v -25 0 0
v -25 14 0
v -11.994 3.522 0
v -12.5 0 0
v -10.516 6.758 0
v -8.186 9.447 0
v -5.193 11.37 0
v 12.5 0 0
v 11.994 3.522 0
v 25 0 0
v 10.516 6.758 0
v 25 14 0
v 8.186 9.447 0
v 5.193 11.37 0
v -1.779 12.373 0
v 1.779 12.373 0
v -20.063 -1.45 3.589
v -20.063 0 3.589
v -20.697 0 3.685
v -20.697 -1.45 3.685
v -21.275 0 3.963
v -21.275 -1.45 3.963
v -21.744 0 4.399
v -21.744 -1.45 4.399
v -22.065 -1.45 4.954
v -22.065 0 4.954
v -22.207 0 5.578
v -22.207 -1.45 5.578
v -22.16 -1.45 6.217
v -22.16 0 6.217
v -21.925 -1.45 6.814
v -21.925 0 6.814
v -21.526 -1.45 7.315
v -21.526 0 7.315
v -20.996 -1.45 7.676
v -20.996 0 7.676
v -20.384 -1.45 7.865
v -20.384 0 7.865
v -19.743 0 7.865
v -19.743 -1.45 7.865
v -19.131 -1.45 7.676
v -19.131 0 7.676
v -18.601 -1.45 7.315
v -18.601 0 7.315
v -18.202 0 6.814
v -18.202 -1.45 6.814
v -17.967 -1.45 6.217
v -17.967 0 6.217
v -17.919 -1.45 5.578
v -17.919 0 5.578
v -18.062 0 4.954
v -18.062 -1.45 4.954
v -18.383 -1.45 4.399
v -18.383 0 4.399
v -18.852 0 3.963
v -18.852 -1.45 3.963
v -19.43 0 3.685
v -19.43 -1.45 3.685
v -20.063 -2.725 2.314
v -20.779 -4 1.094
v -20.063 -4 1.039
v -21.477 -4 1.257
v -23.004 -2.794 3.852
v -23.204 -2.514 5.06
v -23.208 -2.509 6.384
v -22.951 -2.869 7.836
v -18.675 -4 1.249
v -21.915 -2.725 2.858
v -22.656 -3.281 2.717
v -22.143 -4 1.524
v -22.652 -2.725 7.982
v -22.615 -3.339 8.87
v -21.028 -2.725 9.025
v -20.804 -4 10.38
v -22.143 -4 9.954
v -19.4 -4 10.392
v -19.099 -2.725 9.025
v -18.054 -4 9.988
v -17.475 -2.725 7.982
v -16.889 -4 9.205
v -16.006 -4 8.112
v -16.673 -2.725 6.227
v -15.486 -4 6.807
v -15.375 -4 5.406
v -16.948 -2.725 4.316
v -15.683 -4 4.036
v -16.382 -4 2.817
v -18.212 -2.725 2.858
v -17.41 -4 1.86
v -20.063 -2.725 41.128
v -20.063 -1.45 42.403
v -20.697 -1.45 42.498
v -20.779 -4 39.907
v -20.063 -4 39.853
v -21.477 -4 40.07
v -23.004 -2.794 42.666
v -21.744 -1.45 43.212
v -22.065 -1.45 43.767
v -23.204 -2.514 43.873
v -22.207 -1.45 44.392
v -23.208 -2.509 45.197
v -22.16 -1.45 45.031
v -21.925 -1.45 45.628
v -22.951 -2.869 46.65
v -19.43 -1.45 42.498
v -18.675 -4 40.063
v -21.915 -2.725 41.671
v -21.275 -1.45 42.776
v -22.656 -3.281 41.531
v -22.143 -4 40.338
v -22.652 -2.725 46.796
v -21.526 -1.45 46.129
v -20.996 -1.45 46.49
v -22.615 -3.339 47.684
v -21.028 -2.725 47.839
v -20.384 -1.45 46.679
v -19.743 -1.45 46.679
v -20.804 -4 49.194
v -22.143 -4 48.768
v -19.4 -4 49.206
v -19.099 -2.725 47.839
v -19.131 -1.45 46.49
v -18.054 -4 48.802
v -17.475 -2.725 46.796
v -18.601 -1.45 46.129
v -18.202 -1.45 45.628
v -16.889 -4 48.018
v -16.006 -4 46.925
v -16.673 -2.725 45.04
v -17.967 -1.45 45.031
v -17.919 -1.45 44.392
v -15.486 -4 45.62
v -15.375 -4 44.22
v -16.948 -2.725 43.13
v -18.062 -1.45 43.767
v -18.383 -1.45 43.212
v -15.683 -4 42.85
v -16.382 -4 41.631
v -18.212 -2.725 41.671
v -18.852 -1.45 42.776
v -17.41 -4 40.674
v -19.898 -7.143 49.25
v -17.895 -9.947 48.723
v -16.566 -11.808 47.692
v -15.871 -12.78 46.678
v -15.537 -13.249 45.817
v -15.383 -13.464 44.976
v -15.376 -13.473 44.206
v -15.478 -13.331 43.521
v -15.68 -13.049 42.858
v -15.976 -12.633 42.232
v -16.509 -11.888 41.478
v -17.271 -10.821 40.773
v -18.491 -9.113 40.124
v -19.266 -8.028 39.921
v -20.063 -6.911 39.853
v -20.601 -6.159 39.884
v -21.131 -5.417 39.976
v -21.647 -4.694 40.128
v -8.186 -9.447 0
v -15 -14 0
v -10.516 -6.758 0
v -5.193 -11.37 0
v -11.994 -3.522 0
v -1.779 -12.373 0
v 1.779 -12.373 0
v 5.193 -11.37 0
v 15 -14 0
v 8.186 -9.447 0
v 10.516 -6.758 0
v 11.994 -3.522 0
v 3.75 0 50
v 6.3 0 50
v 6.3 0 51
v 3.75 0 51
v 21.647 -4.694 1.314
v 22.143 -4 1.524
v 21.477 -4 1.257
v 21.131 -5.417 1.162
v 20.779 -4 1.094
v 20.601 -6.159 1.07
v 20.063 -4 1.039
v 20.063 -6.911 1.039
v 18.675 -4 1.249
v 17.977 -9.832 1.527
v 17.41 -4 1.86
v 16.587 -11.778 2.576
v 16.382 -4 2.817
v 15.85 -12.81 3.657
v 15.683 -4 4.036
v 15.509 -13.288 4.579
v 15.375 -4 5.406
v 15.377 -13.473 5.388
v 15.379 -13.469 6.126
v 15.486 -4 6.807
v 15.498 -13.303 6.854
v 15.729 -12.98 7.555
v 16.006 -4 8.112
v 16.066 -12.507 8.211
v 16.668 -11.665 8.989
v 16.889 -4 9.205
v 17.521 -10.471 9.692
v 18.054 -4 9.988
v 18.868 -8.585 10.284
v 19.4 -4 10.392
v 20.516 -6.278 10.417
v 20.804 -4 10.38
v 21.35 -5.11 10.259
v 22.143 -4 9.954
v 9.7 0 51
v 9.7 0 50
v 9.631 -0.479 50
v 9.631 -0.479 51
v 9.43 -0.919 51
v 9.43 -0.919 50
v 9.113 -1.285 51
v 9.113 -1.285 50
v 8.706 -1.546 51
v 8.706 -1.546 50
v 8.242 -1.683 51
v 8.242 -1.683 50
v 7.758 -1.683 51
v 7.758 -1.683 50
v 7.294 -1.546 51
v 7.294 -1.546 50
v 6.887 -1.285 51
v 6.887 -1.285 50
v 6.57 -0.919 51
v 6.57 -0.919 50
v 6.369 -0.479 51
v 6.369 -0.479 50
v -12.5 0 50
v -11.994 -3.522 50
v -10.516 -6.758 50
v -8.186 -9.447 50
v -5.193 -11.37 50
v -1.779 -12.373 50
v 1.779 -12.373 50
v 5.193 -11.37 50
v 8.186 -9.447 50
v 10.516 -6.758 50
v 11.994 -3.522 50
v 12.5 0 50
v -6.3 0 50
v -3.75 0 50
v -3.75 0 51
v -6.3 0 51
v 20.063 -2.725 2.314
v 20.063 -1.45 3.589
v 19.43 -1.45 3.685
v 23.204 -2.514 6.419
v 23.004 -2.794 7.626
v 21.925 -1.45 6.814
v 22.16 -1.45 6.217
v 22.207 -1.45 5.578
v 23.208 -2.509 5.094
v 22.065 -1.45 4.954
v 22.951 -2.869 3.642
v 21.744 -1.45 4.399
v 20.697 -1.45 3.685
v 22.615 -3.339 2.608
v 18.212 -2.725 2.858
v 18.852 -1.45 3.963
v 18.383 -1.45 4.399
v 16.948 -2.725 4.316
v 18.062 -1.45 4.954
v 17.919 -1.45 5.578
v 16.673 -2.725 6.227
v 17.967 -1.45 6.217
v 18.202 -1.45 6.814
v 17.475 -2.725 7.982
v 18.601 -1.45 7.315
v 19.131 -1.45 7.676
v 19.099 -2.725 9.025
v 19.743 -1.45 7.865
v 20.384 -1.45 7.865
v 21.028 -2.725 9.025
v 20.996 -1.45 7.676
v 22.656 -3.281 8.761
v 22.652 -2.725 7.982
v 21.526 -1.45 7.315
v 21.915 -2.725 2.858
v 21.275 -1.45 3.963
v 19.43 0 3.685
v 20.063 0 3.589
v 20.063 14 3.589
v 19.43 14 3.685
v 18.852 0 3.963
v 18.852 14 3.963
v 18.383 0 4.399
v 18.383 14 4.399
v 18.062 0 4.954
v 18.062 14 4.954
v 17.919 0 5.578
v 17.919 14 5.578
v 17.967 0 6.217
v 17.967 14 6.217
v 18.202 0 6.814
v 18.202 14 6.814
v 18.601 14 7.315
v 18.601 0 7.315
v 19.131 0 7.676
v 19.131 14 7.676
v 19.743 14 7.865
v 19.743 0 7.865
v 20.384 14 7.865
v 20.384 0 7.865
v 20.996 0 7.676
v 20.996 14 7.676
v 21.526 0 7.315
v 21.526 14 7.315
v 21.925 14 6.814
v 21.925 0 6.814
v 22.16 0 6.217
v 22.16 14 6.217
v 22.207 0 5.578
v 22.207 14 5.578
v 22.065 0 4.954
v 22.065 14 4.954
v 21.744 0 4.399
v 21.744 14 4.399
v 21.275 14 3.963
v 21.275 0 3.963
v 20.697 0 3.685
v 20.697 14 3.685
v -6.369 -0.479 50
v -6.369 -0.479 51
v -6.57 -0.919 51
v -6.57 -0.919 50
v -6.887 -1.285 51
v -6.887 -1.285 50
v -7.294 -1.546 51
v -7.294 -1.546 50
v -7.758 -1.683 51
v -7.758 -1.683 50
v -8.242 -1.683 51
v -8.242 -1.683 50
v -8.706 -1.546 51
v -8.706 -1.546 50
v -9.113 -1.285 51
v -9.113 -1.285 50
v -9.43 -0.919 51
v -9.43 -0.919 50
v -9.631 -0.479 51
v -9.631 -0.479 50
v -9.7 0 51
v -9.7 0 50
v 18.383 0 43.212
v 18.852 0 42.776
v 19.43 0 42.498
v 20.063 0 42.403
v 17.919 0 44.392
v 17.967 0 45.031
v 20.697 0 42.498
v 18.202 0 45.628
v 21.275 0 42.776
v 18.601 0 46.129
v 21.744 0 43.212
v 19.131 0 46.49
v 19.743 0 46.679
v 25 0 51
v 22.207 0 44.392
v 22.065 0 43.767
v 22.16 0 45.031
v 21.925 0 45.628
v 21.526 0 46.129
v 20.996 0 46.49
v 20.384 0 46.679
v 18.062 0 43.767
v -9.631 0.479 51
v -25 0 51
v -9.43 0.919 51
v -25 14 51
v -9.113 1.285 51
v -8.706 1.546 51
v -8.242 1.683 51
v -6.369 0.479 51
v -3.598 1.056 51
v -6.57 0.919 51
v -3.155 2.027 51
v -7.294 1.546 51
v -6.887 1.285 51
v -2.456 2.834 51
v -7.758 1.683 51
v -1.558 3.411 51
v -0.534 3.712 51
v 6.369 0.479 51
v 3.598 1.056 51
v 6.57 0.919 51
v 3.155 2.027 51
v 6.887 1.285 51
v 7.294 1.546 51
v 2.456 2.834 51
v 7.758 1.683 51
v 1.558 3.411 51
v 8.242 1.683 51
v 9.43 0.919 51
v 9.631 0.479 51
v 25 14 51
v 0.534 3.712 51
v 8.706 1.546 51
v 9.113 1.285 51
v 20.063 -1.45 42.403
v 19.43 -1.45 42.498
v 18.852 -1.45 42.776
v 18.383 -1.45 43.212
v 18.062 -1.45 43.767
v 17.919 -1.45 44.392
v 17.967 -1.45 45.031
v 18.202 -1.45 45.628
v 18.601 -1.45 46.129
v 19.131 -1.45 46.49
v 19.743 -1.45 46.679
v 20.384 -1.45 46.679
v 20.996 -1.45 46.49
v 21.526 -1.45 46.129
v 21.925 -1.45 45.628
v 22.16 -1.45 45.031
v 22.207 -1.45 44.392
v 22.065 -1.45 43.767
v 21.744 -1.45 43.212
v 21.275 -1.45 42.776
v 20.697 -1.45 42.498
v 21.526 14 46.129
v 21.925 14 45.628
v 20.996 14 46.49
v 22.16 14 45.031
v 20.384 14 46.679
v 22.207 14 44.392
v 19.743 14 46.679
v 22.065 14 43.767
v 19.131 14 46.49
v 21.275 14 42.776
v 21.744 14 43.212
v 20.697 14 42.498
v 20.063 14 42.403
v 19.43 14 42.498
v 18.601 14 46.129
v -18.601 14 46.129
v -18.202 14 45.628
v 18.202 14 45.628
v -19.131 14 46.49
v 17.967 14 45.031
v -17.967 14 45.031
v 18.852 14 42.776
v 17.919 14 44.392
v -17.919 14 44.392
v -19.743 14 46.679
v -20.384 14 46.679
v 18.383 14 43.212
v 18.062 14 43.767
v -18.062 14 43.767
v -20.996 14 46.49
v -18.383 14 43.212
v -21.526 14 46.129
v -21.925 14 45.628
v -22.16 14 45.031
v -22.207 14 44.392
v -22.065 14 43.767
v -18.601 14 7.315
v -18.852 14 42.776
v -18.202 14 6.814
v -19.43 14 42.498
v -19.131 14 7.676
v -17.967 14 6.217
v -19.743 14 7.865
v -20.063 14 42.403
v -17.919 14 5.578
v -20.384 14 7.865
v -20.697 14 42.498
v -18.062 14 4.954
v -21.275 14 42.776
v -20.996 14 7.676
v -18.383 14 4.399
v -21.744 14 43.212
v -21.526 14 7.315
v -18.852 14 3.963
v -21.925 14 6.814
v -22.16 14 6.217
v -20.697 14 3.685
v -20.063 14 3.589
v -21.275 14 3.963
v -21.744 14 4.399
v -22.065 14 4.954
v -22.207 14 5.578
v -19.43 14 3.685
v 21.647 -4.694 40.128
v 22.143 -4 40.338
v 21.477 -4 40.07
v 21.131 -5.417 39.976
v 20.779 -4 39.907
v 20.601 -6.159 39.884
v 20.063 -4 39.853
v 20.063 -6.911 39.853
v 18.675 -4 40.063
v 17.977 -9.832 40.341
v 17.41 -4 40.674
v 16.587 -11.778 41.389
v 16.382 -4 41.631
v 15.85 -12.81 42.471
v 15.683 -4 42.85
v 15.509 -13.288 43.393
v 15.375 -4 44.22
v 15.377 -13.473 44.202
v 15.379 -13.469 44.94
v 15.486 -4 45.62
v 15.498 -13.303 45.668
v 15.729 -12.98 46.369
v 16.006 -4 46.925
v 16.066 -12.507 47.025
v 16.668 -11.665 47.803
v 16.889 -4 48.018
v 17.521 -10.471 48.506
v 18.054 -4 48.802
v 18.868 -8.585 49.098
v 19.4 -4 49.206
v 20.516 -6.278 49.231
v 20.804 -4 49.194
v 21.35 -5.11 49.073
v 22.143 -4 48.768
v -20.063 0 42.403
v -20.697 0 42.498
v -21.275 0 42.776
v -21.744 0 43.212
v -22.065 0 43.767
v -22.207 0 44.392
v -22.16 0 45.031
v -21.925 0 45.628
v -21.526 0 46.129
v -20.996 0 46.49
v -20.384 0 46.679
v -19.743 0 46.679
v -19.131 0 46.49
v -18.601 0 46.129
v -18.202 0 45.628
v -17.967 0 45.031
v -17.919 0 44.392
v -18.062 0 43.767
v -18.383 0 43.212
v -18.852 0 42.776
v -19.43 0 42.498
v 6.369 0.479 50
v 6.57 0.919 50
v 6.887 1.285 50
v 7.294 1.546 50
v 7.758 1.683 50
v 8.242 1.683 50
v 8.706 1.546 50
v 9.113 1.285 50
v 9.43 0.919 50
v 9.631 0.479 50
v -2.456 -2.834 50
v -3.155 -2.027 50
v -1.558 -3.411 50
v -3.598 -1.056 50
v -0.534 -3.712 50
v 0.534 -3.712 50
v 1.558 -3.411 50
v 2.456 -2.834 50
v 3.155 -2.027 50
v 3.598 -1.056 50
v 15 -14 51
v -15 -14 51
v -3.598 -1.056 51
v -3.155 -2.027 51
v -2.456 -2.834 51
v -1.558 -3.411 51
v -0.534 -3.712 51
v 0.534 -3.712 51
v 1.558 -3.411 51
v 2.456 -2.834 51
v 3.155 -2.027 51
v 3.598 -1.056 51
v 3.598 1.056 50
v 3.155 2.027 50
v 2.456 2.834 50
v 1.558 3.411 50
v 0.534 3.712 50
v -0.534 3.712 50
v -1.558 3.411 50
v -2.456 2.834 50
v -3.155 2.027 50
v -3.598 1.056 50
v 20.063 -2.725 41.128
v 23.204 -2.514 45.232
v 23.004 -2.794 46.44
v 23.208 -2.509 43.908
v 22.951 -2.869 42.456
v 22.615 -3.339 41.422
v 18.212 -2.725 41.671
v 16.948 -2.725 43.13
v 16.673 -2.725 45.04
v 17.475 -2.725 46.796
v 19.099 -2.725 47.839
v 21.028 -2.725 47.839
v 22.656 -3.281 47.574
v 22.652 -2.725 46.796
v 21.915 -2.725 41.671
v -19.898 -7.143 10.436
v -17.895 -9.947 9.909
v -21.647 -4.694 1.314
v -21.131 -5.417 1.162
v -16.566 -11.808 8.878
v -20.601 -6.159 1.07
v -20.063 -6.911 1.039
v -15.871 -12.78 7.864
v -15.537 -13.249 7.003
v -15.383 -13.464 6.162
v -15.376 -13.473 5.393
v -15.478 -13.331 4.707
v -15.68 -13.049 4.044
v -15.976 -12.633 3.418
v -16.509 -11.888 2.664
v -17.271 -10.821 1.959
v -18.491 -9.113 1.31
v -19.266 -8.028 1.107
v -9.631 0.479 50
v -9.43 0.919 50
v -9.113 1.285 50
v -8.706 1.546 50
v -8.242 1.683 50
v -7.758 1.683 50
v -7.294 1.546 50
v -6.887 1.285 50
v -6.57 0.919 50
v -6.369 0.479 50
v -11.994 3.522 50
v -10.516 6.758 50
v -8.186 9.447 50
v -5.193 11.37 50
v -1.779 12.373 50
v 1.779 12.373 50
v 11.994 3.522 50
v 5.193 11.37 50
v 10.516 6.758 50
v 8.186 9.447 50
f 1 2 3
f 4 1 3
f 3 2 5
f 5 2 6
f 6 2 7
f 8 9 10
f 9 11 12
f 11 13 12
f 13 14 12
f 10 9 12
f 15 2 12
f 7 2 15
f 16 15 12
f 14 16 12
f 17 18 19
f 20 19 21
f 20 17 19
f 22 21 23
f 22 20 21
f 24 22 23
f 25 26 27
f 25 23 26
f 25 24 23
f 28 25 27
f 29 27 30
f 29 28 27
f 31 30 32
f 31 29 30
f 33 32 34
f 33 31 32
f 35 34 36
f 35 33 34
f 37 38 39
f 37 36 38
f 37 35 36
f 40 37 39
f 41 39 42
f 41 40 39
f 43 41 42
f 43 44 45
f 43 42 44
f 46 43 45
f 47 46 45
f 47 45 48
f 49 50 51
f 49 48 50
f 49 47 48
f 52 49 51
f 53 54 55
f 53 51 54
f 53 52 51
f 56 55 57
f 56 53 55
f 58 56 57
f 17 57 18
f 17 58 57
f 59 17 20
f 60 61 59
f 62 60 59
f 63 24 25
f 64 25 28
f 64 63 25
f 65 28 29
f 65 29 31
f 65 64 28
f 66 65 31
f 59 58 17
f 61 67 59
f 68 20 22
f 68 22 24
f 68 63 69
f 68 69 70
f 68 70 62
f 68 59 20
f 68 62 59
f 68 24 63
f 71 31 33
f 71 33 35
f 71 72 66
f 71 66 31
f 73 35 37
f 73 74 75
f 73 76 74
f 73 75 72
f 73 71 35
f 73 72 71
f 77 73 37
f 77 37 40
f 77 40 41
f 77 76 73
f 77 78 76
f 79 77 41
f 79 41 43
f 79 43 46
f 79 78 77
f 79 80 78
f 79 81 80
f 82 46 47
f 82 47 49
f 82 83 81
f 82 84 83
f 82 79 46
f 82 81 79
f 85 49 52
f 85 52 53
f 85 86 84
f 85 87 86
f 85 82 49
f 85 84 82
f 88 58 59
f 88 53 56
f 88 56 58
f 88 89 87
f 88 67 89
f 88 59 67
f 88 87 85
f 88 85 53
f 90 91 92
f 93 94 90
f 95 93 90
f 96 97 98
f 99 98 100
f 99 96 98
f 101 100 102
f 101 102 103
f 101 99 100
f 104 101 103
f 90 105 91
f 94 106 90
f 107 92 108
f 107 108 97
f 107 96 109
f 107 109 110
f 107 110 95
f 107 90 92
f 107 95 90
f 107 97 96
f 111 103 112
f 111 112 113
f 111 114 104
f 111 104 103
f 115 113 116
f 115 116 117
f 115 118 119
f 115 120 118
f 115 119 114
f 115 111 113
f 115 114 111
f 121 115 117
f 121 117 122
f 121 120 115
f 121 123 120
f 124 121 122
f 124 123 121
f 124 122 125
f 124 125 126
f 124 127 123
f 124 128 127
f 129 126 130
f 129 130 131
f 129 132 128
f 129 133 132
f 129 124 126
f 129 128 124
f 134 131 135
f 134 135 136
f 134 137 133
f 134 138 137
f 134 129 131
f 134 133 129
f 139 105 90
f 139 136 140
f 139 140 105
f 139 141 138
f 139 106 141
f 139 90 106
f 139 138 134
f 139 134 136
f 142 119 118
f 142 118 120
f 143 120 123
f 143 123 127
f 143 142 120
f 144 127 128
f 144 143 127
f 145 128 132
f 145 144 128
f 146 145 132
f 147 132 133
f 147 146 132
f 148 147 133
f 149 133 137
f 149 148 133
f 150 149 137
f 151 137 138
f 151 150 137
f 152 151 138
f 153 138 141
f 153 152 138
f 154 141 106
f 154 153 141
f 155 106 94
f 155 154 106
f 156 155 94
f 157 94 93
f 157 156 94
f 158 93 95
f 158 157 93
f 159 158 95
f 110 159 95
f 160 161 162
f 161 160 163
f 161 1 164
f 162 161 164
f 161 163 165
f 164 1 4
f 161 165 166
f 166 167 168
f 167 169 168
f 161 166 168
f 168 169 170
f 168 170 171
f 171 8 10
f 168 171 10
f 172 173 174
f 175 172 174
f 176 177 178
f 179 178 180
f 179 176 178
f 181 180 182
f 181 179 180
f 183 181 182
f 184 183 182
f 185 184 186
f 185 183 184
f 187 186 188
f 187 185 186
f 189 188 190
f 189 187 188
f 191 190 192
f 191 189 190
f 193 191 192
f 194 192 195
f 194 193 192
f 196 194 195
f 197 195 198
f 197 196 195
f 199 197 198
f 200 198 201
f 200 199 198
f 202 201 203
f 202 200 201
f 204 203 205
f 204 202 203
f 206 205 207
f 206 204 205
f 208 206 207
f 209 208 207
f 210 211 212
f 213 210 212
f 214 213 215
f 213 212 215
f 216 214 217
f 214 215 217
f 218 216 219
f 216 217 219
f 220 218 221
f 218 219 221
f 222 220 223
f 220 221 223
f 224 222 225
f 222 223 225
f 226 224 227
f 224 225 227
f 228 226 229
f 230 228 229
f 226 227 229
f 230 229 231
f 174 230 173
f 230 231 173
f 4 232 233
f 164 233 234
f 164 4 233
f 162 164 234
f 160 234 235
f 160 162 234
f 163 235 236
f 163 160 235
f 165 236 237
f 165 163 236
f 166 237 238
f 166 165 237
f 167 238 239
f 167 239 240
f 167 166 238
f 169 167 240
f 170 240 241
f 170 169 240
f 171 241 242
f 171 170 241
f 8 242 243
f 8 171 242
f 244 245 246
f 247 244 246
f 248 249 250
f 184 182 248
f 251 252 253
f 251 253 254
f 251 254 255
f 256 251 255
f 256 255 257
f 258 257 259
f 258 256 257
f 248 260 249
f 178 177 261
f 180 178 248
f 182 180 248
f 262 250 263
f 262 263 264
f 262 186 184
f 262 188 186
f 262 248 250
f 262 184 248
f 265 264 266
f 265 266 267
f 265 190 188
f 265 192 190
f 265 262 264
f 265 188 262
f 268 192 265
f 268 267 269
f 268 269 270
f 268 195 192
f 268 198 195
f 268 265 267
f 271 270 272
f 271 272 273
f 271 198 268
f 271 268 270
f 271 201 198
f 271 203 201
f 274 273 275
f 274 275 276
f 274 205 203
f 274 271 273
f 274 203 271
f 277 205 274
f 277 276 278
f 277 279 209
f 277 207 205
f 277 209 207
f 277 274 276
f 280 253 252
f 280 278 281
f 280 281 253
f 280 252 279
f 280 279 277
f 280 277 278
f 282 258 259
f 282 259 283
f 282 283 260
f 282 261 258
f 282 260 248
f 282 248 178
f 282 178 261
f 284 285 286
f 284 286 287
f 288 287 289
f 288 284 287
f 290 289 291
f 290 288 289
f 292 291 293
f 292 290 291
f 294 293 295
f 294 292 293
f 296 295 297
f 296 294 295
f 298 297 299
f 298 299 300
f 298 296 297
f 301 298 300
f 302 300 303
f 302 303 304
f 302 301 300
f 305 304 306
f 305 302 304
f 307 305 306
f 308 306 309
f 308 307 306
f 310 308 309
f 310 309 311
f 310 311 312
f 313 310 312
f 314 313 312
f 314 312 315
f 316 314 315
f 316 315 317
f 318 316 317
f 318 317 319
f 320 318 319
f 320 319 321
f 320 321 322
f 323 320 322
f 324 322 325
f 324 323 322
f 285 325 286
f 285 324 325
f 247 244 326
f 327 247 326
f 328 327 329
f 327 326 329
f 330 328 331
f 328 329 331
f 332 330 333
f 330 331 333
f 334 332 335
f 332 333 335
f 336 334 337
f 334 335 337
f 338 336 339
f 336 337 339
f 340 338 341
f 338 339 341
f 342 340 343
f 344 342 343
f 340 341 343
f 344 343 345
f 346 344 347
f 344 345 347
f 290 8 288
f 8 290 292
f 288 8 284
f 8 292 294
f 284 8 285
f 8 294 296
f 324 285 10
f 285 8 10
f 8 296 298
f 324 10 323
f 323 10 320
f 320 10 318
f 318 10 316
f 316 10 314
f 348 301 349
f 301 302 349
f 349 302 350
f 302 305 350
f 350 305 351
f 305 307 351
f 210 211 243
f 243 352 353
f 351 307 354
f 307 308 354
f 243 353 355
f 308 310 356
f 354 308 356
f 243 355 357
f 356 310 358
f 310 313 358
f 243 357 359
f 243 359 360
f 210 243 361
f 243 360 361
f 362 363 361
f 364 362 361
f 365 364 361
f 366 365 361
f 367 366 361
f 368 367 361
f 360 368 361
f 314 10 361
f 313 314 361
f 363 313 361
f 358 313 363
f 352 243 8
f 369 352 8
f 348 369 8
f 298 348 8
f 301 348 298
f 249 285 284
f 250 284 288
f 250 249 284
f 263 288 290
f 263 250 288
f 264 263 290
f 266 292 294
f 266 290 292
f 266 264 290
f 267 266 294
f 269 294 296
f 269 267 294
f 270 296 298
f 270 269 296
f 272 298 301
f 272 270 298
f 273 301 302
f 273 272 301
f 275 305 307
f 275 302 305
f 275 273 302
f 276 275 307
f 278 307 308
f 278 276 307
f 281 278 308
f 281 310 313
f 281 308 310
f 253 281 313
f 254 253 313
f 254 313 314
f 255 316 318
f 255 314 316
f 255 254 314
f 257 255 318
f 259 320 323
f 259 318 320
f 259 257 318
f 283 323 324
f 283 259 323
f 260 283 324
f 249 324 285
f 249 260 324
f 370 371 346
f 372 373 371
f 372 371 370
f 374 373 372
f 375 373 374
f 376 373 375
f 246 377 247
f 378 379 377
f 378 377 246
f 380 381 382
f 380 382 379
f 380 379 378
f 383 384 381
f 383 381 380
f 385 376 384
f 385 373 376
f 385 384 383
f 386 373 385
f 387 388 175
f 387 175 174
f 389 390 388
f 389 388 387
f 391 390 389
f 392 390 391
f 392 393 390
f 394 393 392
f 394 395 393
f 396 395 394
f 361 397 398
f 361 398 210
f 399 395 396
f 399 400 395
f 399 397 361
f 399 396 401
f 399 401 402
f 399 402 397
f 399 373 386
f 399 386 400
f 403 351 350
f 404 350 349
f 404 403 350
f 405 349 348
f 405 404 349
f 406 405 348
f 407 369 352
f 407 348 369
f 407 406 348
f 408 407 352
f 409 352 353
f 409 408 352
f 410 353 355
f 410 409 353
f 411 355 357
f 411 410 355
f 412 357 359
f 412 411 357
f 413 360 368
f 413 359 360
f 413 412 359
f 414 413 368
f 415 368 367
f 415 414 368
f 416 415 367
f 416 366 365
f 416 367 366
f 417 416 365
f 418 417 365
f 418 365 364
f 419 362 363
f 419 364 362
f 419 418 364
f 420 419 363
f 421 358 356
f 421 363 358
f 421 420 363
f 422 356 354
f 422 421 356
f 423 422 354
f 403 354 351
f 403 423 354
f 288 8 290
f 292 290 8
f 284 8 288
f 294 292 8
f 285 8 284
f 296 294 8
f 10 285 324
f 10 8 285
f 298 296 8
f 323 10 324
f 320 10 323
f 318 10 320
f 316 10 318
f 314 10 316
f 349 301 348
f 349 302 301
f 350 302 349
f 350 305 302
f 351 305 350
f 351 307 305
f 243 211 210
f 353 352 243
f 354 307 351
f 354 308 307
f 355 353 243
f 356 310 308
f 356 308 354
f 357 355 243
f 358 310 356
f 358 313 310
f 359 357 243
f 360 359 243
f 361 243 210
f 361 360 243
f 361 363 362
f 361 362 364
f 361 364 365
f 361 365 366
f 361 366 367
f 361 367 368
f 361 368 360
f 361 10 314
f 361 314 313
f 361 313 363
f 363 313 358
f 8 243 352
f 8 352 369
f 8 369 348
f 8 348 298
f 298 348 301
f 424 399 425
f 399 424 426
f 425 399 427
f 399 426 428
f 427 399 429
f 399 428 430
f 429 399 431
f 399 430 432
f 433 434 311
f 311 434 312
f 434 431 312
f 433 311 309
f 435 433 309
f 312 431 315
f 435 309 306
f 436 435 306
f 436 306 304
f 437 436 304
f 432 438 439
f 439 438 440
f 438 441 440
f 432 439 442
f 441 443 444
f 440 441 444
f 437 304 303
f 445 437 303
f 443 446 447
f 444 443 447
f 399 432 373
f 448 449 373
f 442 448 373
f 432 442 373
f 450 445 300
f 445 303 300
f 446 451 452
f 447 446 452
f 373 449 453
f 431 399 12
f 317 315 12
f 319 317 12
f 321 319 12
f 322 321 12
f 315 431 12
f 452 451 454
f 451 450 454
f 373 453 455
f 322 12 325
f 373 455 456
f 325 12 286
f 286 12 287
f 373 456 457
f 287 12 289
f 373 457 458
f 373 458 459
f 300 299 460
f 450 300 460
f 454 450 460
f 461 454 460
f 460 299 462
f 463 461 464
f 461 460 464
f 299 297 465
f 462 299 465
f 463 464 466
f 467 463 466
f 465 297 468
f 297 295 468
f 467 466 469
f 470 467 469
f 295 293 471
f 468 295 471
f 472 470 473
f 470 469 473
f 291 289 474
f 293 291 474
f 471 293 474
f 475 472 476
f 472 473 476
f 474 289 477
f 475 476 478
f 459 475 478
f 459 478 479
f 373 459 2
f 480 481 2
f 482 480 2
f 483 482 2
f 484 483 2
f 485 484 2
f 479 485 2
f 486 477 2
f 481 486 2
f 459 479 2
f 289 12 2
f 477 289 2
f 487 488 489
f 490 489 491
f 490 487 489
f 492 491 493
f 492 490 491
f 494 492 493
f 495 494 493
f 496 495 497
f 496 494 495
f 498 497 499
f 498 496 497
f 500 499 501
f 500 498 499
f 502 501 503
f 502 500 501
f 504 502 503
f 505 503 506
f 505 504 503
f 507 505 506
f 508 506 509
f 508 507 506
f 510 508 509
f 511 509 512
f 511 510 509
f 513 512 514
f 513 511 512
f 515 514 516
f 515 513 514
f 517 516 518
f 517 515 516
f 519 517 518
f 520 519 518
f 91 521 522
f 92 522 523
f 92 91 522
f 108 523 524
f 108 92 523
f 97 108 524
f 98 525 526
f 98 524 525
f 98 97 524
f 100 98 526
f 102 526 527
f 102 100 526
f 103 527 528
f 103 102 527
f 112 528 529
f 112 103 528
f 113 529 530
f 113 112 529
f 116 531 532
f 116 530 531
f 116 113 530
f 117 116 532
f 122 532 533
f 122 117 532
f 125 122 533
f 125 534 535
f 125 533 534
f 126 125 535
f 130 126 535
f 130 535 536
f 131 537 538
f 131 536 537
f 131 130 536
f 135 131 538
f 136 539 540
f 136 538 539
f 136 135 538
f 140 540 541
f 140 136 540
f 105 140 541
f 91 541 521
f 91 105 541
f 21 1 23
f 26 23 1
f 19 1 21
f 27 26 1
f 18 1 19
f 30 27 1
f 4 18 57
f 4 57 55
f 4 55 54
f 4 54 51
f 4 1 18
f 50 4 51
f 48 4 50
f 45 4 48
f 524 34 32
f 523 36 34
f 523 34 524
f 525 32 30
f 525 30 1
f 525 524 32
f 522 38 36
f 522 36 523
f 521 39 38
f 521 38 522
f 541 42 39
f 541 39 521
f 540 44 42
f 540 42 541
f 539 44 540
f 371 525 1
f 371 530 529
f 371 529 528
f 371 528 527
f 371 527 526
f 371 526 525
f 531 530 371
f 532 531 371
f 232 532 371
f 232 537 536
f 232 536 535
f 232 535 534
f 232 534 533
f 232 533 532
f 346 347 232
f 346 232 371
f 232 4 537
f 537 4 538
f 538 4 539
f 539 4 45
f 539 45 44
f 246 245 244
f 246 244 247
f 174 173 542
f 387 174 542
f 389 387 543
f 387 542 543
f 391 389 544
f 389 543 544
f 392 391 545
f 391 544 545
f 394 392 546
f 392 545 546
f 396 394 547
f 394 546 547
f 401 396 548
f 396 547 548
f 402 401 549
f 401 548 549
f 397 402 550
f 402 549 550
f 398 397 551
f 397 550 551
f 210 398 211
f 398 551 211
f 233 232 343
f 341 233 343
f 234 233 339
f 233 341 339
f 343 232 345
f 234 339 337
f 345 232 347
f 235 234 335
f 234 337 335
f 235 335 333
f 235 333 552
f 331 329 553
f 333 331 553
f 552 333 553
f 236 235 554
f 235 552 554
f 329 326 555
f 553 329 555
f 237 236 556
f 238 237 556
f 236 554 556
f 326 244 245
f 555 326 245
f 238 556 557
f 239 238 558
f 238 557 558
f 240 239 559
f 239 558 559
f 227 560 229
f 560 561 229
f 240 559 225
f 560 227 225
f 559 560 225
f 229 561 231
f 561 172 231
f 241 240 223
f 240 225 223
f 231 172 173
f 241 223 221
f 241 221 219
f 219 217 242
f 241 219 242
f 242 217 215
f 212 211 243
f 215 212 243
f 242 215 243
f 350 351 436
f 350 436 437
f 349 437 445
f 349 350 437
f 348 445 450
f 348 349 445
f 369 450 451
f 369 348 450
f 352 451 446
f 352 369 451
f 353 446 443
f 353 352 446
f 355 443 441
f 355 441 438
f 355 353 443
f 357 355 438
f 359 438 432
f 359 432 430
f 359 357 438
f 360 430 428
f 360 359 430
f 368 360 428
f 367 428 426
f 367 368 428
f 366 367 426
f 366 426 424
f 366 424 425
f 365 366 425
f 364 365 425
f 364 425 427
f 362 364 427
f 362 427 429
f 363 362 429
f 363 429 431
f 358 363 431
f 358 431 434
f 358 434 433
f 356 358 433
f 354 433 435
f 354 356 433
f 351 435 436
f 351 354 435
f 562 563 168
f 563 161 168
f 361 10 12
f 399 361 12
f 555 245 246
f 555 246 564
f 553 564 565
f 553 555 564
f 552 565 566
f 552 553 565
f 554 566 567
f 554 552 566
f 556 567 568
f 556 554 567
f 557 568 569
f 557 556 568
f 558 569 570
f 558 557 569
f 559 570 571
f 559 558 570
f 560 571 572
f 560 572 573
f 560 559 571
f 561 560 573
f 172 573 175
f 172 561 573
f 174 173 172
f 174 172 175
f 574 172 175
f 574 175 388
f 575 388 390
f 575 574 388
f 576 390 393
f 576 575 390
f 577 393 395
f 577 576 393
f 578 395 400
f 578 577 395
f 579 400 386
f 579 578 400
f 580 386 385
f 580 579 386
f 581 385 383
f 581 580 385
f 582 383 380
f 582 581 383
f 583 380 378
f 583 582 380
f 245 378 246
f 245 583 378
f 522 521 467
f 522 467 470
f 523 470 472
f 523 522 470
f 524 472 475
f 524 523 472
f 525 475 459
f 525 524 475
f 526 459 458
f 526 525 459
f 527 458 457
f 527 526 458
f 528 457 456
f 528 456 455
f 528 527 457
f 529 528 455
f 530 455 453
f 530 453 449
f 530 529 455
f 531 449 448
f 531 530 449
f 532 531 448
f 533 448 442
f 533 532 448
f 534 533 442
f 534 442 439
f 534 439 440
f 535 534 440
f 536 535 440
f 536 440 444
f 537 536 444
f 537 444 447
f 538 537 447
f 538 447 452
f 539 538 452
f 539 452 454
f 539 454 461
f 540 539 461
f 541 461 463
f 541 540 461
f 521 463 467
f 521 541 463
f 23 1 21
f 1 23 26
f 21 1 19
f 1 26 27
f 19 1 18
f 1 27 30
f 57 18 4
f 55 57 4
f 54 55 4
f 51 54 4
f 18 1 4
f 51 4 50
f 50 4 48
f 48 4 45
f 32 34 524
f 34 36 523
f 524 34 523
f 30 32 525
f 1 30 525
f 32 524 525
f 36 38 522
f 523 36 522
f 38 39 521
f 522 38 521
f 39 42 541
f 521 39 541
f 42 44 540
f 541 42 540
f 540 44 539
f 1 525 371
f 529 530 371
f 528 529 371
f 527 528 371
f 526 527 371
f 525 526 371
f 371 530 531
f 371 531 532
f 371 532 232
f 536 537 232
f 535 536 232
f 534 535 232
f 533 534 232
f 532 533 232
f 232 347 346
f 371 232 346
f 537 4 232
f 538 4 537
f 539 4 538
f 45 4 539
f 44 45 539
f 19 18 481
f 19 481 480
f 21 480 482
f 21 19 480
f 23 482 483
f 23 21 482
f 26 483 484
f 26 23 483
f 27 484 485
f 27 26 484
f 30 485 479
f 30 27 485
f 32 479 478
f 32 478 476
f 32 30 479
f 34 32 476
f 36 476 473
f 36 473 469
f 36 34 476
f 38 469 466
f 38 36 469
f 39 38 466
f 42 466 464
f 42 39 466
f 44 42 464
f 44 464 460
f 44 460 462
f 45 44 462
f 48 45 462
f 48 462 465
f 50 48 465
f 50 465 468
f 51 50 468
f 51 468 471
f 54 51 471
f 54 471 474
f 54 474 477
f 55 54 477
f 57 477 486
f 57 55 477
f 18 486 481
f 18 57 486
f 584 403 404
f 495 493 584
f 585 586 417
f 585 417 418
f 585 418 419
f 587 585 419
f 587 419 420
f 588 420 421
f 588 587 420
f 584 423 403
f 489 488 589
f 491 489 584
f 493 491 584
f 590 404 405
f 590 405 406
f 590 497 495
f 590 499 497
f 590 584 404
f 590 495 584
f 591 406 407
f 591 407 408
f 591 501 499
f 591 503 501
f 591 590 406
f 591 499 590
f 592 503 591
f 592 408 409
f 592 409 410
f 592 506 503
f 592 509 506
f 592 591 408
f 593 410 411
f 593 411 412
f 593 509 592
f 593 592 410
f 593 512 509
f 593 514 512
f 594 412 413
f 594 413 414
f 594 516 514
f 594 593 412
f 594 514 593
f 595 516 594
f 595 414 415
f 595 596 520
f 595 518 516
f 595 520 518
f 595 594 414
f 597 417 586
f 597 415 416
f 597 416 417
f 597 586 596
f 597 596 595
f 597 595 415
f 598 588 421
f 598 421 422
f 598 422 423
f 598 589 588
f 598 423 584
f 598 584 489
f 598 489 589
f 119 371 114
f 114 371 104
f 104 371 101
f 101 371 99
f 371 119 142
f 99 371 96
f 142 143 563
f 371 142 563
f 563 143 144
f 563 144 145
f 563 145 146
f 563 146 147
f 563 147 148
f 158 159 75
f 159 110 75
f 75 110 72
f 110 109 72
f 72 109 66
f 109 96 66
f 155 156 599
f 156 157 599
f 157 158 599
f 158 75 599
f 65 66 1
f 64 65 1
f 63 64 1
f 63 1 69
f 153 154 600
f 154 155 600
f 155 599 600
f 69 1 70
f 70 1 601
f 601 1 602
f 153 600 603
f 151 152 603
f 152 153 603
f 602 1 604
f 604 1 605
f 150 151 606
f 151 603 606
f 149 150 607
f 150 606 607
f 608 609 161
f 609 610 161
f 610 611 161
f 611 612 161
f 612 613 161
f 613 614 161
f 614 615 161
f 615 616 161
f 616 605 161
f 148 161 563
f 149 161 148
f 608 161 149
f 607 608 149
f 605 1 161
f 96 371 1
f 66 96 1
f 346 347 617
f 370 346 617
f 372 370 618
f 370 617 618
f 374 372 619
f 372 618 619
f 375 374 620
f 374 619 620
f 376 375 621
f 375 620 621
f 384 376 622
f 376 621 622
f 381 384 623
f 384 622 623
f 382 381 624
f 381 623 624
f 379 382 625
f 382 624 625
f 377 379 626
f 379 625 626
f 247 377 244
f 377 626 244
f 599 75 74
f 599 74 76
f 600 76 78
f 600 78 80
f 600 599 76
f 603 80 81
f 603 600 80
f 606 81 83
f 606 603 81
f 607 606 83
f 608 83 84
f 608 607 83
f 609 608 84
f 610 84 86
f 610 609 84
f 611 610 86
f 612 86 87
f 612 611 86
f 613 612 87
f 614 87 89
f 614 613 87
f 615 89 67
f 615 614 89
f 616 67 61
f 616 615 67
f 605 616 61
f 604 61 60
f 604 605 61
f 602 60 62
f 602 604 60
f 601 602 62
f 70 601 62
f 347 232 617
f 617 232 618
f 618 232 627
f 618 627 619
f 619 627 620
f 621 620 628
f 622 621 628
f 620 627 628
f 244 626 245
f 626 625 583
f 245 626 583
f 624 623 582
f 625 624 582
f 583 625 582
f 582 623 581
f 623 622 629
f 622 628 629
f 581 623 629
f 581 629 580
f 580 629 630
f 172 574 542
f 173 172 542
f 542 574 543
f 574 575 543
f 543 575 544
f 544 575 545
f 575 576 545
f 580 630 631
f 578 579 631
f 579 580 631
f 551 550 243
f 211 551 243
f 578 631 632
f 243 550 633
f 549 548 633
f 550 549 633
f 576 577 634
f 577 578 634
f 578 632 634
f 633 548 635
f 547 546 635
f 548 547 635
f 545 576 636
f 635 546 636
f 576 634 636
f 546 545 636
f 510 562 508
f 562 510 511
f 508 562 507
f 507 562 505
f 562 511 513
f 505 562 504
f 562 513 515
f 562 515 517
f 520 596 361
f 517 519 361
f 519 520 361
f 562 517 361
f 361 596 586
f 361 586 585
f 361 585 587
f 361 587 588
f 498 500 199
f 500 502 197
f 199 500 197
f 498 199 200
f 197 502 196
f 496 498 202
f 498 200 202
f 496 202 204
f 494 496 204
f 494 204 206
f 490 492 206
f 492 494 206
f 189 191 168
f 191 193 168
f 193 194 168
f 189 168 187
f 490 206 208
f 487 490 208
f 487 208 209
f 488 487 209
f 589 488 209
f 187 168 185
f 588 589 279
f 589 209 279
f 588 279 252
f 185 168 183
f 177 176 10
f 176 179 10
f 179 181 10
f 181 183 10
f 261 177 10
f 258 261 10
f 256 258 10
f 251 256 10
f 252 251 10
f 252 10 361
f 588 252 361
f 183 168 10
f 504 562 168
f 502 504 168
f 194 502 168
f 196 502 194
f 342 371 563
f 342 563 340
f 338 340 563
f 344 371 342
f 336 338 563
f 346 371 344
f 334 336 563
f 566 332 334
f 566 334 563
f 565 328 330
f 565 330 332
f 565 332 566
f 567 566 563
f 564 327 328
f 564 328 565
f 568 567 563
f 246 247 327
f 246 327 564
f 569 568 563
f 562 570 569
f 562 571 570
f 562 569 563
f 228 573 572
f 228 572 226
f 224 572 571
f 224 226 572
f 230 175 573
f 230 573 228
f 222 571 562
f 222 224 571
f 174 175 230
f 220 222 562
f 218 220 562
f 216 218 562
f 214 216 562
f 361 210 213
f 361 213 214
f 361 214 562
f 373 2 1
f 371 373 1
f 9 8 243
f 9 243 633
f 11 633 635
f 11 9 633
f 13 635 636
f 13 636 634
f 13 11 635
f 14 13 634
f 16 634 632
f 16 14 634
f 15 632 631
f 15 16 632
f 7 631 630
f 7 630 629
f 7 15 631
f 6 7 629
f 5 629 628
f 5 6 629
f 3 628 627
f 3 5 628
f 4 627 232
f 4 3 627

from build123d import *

# Parameters (mm, degrees)
ESQUISSE1_W                                 = 10
ESQUISSE1_H                                 = 14
ESQUISSE1_W_2                               = 30
ESQUISSE1_H_2                               = 28
ESQUISSE1_R                                 = 12.5
BOSS_EXTRU_1_DEPTH                          = 50
FRAISAGE_POUR_VIS_T_TE_FRAIS_E_M41_AT_COUNT = 2
FRAISAGE_POUR_VIS_T_TE_FRAIS_E_M41_AT_PITCH = 40.126930435
FRAISAGE_POUR_VIS_T_TE_FRAIS_E_M41_2_COUNT  = 2
FRAISAGE_POUR_VIS_T_TE_FRAIS_E_M41_2_PITCH  = 55.827168328
FRAISAGE_POUR_VIS_T_TE_FRAIS_E_M41_3_COUNT  = 2
FRAISAGE_POUR_VIS_T_TE_FRAIS_E_M41_3_PITCH  = 38.813685439
ESQUISSE26_R                                = 3.75
BOSS_EXTRU_2_DEPTH                          = 1
D_GAGEMENT_M31_D                            = 3.4


with BuildPart() as part:
    # Esquisse1 → Boss.-Extru.1 (new body)
    # profile 1 of 5: a face of its own
    with BuildSketch(Plane.XY):
        with Locations((-20, 7)):
            Rectangle(ESQUISSE1_W, ESQUISSE1_H)
    # profile 2 of 5: a face of its own
    with BuildSketch(Plane.XY):
        Polygon((-15, -14), (-15, 0), (-25, 0), align=None)
    # profile 3 of 5: a face of its own
    with BuildSketch(Plane.XY):
        Rectangle(ESQUISSE1_W_2, ESQUISSE1_H_2)
        Circle(ESQUISSE1_R, mode=Mode.SUBTRACT)
    # profile 4 of 5: a face of its own
    with BuildSketch(Plane.XY):
        Polygon((25, 0), (15, 0), (15, -14), align=None)
    # profile 5 of 5: a face of its own
    with BuildSketch(Plane.XY):
        with Locations((20, 7)):
            Rectangle(ESQUISSE1_W, ESQUISSE1_H)
    extrude(amount=BOSS_EXTRU_1_DEPTH)

    # Esquisse25 → Fraisage pour vis à tête fraisée M41 (revolve, cut)
    with BuildSketch(Plane(origin=(20.063465217, -14, 5.739073391), x_dir=(0, 0, -1), z_dir=(1, 0, 0))):
        Polygon((0, 0), (0, 28), (2.15, 28), (2.15, 12.55), (4.7, 10), (4.7, 0), align=None)
    fraisage_pour_vis_t_te_frais_e_m41 = revolve(axis=Axis((20.063465217, -20.35, 5.739073391), (0, 1, 0)), mode=Mode.SUBTRACT)

    # Fraisage pour vis à tête fraisée M41 at: Fraisage pour vis à tête fraisée M41 ×2
    with Locations(*[(-i * FRAISAGE_POUR_VIS_T_TE_FRAIS_E_M41_AT_PITCH, 0, 0) for i in range(1, FRAISAGE_POUR_VIS_T_TE_FRAIS_E_M41_AT_COUNT)]):
        add(fraisage_pour_vis_t_te_frais_e_m41, mode=Mode.SUBTRACT)

    # Fraisage pour vis _ t_te frais_e M41 2: Fraisage pour vis à tête fraisée M41 ×2
    with Locations(*[Vector(-0.7187706565997187, 0, 0.695247253292819) * (i * FRAISAGE_POUR_VIS_T_TE_FRAIS_E_M41_2_PITCH) for i in range(1, FRAISAGE_POUR_VIS_T_TE_FRAIS_E_M41_2_COUNT)]):
        add(fraisage_pour_vis_t_te_frais_e_m41, mode=Mode.SUBTRACT)

    # Fraisage pour vis _ t_te frais_e M41 3: Fraisage pour vis à tête fraisée M41 ×2
    with Locations(*[(0, 0, i * FRAISAGE_POUR_VIS_T_TE_FRAIS_E_M41_3_PITCH) for i in range(1, FRAISAGE_POUR_VIS_T_TE_FRAIS_E_M41_3_COUNT)]):
        add(fraisage_pour_vis_t_te_frais_e_m41, mode=Mode.SUBTRACT)

    # Esquisse26 → Boss.-Extru.2 (add)
    with BuildSketch(Plane.XY.offset(50)):
        Polygon((-25, 14), (-25, 0), (-15, -14), (15, -14), (25, 0), (25, 14), align=None)
        Circle(ESQUISSE26_R, mode=Mode.SUBTRACT)
    extrude(amount=BOSS_EXTRU_2_DEPTH)

    # Dégagement M31 (through all)
    with Locations(Plane.XY.offset(51)):
        with Locations((-8, 0), (8, 0)):
            Hole(D_GAGEMENT_M31_D / 2)


with BuildPart() as body_2:
    # Fractionner1: the piece on the far side of the plane
    add(part.part)
    split(bisect_by=Plane.ZX, keep=Keep.BOTTOM)


with BuildPart() as part_1:
    add(part.part)

    # Fractionner1
    split(bisect_by=Plane.ZX, keep=Keep.TOP)


solid = Compound([body_2.part, part_1.part])
